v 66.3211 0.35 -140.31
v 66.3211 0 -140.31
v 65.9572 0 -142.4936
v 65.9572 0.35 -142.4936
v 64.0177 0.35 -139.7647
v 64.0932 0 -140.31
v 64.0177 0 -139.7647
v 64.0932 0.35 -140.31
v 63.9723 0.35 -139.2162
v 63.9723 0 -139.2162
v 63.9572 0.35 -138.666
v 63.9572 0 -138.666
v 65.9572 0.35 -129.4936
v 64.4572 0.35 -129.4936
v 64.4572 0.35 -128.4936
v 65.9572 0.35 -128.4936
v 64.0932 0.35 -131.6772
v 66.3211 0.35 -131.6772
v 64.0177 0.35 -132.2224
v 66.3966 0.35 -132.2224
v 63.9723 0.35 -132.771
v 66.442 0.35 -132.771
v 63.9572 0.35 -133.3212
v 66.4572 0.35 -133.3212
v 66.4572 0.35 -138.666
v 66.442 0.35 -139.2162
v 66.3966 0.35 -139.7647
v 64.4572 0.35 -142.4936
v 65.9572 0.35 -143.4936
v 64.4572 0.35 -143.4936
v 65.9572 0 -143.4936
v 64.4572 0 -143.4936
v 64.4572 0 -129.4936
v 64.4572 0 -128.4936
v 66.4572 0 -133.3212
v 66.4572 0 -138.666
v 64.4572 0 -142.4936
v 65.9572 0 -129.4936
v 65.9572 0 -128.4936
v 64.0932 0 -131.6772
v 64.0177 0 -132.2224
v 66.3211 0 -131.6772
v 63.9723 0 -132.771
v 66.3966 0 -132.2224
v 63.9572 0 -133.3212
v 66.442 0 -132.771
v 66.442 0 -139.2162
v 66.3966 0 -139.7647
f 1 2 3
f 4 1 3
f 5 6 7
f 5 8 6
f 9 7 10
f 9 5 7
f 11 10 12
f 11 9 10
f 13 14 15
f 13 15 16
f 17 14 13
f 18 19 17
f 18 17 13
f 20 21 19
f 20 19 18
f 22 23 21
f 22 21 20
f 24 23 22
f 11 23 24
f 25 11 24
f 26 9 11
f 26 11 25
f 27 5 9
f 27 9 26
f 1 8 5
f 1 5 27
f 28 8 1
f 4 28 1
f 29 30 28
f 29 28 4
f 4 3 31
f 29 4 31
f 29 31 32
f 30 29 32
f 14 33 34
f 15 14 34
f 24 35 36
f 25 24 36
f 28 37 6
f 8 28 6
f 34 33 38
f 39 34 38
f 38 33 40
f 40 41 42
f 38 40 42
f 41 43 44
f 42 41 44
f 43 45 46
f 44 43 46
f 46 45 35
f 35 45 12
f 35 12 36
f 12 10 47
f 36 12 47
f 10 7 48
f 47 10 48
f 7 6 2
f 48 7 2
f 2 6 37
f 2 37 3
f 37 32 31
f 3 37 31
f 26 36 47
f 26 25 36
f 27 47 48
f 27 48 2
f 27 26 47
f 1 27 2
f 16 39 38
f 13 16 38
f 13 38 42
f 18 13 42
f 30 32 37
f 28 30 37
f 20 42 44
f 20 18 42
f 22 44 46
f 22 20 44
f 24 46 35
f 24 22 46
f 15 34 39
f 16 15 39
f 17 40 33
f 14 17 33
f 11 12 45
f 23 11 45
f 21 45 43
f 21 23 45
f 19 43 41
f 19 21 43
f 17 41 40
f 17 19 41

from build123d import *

# Parameters (mm, degrees)
BOSS_EXTRUDE1_DEPTH = 0.35
FILLET1_R           = 10


with BuildPart() as part:
    # Sketch1 → Boss-Extrude1 (new body)
    with BuildSketch(Plane(origin=(0, 0, 0.002129552), x_dir=(1, 0, 0), z_dir=(0, 1, 0))):
        Polygon((65.957189, 129.495721477), (66.457189, 132.495721477), (66.457189, 139.495721477), (65.957189, 142.495721477), (65.957189, 143.495721477), (64.457189, 143.495721477), (64.457189, 142.495721477), (63.957189, 139.495721477), (63.957189, 132.495721477), (64.457189, 129.495721477), (64.457189, 128.495721477), (65.207189, 128.495721477), (65.957189, 128.495721477), align=None)
    extrude(amount=BOSS_EXTRUDE1_DEPTH)

    # Fillet1
    fillet1_edges = [part.edges().sort_by_distance(p)[0] for p in [
        (66.457189, 0.175, -132.493591924),
        (63.957189, 0.175, -132.493591924),
        (63.957189, 0.175, -139.493591924),
        (66.457189, 0.175, -139.493591924),
    ]]
    fillet(fillet1_edges, radius=FILLET1_R)


solid = part.part
